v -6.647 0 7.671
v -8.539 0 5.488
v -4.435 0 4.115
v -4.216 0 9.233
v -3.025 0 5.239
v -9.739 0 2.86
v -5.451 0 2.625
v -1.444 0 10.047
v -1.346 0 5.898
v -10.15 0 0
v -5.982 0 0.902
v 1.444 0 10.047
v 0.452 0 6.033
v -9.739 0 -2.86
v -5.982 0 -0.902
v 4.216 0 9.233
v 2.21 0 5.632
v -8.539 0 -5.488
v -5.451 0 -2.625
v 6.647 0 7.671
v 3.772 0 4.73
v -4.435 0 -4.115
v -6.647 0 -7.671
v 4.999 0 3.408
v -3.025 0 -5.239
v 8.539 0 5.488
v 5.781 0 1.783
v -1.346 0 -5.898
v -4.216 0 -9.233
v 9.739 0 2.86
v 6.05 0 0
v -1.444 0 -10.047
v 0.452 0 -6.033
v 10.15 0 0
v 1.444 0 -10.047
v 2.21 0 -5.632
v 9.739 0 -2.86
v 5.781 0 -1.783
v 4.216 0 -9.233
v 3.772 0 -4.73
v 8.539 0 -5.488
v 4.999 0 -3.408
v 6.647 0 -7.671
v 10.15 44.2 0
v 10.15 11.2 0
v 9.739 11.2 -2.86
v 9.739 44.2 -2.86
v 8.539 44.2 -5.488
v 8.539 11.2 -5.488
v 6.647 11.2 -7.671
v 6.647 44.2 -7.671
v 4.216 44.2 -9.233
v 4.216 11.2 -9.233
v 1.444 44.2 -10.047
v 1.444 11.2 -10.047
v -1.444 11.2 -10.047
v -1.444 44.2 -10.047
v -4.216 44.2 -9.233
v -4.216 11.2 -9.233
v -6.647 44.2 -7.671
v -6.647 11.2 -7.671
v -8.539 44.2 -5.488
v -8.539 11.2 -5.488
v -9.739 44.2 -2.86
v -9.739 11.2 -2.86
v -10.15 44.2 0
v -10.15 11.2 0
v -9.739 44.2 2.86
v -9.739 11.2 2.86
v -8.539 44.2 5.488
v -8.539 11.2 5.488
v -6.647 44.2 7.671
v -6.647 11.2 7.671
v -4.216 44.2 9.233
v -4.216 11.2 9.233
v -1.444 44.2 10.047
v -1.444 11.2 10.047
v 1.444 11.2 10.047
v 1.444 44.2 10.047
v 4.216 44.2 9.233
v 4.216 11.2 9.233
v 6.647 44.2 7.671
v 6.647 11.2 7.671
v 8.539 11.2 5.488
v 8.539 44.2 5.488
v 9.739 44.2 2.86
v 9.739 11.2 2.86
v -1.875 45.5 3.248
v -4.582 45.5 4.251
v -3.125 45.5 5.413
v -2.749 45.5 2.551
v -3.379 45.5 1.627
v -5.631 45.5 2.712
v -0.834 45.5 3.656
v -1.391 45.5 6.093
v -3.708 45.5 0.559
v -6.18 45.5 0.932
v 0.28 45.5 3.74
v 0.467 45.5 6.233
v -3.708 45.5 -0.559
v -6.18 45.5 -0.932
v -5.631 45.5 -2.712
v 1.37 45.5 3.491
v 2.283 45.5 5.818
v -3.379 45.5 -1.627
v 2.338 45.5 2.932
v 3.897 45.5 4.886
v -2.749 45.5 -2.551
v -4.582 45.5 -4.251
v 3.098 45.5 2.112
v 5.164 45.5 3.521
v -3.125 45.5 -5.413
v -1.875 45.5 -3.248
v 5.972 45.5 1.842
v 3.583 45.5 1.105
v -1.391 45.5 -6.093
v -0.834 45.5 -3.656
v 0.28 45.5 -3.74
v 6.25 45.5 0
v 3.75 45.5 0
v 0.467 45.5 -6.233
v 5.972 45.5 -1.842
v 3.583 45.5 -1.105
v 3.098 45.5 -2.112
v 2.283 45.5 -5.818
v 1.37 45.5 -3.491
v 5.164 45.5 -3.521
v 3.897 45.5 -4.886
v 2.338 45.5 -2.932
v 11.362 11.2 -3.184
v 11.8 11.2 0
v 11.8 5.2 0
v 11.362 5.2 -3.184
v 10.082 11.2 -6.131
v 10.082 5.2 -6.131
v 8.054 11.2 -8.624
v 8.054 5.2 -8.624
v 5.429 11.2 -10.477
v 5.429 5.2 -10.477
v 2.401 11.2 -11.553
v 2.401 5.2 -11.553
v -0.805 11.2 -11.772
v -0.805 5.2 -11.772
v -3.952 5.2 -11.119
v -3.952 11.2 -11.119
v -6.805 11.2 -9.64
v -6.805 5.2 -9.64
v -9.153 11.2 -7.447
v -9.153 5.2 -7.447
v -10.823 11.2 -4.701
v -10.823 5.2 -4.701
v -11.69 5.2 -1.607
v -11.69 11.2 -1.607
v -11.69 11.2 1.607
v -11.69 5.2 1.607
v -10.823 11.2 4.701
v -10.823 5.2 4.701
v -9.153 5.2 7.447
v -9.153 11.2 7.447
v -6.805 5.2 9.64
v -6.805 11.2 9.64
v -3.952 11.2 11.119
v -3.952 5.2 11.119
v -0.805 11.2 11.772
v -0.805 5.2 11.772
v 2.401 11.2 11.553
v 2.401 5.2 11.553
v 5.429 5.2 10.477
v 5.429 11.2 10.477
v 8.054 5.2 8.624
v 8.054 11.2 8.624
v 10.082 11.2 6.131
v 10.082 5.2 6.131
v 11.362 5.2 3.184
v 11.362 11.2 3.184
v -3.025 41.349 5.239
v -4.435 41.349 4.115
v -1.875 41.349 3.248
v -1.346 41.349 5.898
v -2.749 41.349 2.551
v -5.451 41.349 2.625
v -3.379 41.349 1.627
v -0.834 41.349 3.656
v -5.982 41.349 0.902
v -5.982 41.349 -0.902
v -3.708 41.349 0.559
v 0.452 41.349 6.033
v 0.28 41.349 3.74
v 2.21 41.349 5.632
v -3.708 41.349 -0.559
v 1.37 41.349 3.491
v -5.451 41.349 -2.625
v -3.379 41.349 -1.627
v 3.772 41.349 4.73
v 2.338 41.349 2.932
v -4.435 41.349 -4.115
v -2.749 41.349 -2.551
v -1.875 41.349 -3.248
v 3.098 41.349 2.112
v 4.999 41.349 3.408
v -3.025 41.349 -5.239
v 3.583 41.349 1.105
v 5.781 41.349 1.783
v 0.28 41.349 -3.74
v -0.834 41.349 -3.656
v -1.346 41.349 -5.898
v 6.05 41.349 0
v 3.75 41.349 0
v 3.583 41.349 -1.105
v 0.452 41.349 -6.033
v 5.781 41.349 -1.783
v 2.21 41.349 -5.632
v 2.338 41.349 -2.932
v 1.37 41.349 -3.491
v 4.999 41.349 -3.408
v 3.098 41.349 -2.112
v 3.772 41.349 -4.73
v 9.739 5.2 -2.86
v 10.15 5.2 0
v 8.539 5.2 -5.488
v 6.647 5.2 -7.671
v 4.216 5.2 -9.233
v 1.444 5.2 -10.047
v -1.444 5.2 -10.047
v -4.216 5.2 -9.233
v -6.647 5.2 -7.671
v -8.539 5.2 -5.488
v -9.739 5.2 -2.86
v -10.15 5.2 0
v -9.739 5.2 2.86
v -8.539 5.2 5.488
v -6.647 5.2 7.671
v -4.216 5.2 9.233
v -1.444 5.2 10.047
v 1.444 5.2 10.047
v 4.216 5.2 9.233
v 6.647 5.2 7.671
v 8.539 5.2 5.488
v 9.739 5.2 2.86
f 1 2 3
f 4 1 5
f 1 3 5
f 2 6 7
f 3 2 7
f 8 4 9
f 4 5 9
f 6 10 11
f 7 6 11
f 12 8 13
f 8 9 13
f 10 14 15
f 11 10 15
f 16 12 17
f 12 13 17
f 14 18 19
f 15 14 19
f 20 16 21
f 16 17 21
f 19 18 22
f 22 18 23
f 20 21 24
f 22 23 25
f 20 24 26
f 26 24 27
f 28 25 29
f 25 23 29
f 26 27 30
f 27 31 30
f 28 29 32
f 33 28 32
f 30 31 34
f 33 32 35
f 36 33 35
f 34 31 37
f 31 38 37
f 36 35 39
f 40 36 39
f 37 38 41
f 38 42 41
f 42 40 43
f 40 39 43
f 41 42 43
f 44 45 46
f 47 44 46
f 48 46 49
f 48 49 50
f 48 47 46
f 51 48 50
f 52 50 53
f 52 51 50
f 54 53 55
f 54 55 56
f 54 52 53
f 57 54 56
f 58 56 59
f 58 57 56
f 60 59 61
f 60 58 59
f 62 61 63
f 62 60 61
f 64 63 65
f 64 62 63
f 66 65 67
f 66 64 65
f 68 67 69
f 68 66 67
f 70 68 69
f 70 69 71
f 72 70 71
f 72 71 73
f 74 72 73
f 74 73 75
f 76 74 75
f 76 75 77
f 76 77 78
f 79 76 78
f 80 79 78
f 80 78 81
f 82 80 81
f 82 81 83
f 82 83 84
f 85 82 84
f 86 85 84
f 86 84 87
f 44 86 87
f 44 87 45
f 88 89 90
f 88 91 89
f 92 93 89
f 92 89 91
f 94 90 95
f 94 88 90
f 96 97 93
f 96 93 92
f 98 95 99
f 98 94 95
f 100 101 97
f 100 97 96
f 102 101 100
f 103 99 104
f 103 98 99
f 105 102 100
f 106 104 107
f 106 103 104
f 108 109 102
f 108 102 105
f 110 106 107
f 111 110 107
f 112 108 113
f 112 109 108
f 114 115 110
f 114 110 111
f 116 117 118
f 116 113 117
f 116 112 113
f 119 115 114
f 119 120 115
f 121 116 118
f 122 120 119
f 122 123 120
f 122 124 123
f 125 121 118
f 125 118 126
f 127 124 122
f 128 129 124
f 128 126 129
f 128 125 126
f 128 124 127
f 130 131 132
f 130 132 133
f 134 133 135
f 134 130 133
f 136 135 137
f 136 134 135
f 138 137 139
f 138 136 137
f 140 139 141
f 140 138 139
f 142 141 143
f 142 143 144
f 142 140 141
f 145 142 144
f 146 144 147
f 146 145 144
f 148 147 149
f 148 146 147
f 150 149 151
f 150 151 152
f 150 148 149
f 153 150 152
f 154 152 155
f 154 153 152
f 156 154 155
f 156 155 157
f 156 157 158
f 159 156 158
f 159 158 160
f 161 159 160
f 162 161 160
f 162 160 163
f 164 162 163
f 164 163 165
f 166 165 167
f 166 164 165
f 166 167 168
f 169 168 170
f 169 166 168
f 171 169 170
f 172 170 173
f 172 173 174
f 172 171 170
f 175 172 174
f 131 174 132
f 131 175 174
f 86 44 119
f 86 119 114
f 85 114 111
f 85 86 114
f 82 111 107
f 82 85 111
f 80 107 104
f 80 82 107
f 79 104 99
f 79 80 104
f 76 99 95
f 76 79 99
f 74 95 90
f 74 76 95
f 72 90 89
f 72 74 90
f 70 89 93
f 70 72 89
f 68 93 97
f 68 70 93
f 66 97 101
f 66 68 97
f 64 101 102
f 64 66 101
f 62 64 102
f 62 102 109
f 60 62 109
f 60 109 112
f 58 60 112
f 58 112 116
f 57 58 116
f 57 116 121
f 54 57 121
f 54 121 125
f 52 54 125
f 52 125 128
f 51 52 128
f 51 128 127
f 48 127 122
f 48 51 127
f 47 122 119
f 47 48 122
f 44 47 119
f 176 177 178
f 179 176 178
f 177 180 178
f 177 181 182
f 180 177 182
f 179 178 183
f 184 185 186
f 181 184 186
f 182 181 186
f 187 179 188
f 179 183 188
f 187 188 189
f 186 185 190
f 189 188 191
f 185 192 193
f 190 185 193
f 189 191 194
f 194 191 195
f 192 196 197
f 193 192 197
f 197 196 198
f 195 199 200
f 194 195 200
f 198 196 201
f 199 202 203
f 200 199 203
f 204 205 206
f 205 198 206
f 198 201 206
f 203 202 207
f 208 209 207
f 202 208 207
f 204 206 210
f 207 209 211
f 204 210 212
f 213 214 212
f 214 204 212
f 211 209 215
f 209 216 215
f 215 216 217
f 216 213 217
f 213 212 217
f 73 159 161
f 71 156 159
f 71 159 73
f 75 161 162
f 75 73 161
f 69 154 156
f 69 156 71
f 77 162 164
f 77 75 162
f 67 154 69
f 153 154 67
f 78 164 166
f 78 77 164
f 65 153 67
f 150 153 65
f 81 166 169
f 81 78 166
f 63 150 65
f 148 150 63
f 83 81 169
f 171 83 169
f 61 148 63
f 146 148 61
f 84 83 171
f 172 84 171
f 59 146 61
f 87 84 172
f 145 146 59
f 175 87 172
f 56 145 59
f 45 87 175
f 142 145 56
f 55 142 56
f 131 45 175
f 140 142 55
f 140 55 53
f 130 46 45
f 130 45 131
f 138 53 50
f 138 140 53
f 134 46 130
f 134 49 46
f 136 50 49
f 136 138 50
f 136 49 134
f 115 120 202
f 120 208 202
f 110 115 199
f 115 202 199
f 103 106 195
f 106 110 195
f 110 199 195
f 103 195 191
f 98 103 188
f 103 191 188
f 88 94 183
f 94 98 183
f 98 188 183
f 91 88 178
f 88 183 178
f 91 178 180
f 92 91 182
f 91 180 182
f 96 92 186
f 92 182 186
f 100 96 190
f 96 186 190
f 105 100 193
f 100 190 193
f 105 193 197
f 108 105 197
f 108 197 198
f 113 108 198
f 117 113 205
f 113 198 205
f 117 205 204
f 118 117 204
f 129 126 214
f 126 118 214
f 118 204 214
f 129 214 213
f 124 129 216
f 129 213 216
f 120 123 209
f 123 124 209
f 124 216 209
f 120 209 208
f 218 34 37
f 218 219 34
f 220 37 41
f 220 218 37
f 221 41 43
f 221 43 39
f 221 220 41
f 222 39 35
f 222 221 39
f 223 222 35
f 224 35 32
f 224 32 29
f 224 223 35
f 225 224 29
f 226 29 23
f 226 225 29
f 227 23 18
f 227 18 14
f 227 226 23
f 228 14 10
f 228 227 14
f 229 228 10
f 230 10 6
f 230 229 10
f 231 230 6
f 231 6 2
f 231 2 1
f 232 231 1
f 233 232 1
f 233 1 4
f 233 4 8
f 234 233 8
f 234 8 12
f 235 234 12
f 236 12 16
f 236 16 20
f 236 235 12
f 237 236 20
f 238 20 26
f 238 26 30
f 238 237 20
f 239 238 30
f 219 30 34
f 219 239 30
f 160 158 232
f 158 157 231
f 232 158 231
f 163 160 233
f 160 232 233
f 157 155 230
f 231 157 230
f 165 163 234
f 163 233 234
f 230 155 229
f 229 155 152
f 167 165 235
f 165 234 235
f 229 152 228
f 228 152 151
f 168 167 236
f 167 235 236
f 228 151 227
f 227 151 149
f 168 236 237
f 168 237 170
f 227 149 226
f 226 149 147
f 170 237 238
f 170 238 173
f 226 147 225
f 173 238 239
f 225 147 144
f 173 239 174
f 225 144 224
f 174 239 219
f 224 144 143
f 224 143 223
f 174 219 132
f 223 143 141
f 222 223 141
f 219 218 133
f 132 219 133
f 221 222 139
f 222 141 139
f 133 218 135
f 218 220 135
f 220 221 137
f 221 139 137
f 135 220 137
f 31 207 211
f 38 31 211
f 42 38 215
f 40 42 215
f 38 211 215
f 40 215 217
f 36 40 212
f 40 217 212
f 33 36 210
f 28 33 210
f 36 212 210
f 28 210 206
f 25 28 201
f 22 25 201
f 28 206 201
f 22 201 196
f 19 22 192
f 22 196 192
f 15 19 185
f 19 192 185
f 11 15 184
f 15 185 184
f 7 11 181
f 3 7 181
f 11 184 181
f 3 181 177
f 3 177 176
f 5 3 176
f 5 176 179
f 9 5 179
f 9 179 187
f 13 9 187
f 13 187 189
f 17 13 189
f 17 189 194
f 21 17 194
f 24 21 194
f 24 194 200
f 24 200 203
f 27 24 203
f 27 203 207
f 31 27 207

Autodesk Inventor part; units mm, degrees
ref_plane "XZ Plane" through (0, 0, 0) normal (0, 1, 0) x (-1, 0, 0)
sketch "Sketch1" plane through (0, 0, 0) normal (0, 0, 1) x (1, 0, 0)
  line L0 (6.05, 0) -> (6.05, 41.3489)
  line L1 (6.05, 0) -> (10.15, 0)
  line L2 (10.15, 0) -> (10.15, 5.2)
  line L3 (10.15, 5.2) -> (11.8, 5.2)
  line L4 (11.8, 5.2) -> (11.8, 11.2)
  line L5 (11.8, 11.2) -> (10.15, 11.2)
  line L6 (0, -9.1) -> (0, 54.6) construction
  line L7 (10.15, 11.2) -> (10.15, 44.2)
  line L8 (6.25, 45.5) -> (10.15, 44.2)
  line L9 (6.25, 45.5) -> (3.75, 45.5)
  line L10 (3.75, 45.5) -> (3.75, 41.3489)
  line L11 (3.75, 41.3489) -> (6.05, 41.3489)
  point P0 (0, 0)
  dimension "d0" = 10.15
  dimension "d1" = 4.1
  dimension "d2" = 11.2
  dimension "d3" = 11.8
  dimension "d5" = 6.05
  dimension "d9" = 44.2
  dimension "d11" = 45.5
  dimension "d13" = 6
  dimension "d14" = 3.75
  dimension "d15" = 4.1511
  dimension "d16" = 6.25
revolve "Revolution1" add sketch "Sketch1" angle 360 about axis through (0, -10, 0) along (0, 1, 0)
properties part number "Objective-Lens"
